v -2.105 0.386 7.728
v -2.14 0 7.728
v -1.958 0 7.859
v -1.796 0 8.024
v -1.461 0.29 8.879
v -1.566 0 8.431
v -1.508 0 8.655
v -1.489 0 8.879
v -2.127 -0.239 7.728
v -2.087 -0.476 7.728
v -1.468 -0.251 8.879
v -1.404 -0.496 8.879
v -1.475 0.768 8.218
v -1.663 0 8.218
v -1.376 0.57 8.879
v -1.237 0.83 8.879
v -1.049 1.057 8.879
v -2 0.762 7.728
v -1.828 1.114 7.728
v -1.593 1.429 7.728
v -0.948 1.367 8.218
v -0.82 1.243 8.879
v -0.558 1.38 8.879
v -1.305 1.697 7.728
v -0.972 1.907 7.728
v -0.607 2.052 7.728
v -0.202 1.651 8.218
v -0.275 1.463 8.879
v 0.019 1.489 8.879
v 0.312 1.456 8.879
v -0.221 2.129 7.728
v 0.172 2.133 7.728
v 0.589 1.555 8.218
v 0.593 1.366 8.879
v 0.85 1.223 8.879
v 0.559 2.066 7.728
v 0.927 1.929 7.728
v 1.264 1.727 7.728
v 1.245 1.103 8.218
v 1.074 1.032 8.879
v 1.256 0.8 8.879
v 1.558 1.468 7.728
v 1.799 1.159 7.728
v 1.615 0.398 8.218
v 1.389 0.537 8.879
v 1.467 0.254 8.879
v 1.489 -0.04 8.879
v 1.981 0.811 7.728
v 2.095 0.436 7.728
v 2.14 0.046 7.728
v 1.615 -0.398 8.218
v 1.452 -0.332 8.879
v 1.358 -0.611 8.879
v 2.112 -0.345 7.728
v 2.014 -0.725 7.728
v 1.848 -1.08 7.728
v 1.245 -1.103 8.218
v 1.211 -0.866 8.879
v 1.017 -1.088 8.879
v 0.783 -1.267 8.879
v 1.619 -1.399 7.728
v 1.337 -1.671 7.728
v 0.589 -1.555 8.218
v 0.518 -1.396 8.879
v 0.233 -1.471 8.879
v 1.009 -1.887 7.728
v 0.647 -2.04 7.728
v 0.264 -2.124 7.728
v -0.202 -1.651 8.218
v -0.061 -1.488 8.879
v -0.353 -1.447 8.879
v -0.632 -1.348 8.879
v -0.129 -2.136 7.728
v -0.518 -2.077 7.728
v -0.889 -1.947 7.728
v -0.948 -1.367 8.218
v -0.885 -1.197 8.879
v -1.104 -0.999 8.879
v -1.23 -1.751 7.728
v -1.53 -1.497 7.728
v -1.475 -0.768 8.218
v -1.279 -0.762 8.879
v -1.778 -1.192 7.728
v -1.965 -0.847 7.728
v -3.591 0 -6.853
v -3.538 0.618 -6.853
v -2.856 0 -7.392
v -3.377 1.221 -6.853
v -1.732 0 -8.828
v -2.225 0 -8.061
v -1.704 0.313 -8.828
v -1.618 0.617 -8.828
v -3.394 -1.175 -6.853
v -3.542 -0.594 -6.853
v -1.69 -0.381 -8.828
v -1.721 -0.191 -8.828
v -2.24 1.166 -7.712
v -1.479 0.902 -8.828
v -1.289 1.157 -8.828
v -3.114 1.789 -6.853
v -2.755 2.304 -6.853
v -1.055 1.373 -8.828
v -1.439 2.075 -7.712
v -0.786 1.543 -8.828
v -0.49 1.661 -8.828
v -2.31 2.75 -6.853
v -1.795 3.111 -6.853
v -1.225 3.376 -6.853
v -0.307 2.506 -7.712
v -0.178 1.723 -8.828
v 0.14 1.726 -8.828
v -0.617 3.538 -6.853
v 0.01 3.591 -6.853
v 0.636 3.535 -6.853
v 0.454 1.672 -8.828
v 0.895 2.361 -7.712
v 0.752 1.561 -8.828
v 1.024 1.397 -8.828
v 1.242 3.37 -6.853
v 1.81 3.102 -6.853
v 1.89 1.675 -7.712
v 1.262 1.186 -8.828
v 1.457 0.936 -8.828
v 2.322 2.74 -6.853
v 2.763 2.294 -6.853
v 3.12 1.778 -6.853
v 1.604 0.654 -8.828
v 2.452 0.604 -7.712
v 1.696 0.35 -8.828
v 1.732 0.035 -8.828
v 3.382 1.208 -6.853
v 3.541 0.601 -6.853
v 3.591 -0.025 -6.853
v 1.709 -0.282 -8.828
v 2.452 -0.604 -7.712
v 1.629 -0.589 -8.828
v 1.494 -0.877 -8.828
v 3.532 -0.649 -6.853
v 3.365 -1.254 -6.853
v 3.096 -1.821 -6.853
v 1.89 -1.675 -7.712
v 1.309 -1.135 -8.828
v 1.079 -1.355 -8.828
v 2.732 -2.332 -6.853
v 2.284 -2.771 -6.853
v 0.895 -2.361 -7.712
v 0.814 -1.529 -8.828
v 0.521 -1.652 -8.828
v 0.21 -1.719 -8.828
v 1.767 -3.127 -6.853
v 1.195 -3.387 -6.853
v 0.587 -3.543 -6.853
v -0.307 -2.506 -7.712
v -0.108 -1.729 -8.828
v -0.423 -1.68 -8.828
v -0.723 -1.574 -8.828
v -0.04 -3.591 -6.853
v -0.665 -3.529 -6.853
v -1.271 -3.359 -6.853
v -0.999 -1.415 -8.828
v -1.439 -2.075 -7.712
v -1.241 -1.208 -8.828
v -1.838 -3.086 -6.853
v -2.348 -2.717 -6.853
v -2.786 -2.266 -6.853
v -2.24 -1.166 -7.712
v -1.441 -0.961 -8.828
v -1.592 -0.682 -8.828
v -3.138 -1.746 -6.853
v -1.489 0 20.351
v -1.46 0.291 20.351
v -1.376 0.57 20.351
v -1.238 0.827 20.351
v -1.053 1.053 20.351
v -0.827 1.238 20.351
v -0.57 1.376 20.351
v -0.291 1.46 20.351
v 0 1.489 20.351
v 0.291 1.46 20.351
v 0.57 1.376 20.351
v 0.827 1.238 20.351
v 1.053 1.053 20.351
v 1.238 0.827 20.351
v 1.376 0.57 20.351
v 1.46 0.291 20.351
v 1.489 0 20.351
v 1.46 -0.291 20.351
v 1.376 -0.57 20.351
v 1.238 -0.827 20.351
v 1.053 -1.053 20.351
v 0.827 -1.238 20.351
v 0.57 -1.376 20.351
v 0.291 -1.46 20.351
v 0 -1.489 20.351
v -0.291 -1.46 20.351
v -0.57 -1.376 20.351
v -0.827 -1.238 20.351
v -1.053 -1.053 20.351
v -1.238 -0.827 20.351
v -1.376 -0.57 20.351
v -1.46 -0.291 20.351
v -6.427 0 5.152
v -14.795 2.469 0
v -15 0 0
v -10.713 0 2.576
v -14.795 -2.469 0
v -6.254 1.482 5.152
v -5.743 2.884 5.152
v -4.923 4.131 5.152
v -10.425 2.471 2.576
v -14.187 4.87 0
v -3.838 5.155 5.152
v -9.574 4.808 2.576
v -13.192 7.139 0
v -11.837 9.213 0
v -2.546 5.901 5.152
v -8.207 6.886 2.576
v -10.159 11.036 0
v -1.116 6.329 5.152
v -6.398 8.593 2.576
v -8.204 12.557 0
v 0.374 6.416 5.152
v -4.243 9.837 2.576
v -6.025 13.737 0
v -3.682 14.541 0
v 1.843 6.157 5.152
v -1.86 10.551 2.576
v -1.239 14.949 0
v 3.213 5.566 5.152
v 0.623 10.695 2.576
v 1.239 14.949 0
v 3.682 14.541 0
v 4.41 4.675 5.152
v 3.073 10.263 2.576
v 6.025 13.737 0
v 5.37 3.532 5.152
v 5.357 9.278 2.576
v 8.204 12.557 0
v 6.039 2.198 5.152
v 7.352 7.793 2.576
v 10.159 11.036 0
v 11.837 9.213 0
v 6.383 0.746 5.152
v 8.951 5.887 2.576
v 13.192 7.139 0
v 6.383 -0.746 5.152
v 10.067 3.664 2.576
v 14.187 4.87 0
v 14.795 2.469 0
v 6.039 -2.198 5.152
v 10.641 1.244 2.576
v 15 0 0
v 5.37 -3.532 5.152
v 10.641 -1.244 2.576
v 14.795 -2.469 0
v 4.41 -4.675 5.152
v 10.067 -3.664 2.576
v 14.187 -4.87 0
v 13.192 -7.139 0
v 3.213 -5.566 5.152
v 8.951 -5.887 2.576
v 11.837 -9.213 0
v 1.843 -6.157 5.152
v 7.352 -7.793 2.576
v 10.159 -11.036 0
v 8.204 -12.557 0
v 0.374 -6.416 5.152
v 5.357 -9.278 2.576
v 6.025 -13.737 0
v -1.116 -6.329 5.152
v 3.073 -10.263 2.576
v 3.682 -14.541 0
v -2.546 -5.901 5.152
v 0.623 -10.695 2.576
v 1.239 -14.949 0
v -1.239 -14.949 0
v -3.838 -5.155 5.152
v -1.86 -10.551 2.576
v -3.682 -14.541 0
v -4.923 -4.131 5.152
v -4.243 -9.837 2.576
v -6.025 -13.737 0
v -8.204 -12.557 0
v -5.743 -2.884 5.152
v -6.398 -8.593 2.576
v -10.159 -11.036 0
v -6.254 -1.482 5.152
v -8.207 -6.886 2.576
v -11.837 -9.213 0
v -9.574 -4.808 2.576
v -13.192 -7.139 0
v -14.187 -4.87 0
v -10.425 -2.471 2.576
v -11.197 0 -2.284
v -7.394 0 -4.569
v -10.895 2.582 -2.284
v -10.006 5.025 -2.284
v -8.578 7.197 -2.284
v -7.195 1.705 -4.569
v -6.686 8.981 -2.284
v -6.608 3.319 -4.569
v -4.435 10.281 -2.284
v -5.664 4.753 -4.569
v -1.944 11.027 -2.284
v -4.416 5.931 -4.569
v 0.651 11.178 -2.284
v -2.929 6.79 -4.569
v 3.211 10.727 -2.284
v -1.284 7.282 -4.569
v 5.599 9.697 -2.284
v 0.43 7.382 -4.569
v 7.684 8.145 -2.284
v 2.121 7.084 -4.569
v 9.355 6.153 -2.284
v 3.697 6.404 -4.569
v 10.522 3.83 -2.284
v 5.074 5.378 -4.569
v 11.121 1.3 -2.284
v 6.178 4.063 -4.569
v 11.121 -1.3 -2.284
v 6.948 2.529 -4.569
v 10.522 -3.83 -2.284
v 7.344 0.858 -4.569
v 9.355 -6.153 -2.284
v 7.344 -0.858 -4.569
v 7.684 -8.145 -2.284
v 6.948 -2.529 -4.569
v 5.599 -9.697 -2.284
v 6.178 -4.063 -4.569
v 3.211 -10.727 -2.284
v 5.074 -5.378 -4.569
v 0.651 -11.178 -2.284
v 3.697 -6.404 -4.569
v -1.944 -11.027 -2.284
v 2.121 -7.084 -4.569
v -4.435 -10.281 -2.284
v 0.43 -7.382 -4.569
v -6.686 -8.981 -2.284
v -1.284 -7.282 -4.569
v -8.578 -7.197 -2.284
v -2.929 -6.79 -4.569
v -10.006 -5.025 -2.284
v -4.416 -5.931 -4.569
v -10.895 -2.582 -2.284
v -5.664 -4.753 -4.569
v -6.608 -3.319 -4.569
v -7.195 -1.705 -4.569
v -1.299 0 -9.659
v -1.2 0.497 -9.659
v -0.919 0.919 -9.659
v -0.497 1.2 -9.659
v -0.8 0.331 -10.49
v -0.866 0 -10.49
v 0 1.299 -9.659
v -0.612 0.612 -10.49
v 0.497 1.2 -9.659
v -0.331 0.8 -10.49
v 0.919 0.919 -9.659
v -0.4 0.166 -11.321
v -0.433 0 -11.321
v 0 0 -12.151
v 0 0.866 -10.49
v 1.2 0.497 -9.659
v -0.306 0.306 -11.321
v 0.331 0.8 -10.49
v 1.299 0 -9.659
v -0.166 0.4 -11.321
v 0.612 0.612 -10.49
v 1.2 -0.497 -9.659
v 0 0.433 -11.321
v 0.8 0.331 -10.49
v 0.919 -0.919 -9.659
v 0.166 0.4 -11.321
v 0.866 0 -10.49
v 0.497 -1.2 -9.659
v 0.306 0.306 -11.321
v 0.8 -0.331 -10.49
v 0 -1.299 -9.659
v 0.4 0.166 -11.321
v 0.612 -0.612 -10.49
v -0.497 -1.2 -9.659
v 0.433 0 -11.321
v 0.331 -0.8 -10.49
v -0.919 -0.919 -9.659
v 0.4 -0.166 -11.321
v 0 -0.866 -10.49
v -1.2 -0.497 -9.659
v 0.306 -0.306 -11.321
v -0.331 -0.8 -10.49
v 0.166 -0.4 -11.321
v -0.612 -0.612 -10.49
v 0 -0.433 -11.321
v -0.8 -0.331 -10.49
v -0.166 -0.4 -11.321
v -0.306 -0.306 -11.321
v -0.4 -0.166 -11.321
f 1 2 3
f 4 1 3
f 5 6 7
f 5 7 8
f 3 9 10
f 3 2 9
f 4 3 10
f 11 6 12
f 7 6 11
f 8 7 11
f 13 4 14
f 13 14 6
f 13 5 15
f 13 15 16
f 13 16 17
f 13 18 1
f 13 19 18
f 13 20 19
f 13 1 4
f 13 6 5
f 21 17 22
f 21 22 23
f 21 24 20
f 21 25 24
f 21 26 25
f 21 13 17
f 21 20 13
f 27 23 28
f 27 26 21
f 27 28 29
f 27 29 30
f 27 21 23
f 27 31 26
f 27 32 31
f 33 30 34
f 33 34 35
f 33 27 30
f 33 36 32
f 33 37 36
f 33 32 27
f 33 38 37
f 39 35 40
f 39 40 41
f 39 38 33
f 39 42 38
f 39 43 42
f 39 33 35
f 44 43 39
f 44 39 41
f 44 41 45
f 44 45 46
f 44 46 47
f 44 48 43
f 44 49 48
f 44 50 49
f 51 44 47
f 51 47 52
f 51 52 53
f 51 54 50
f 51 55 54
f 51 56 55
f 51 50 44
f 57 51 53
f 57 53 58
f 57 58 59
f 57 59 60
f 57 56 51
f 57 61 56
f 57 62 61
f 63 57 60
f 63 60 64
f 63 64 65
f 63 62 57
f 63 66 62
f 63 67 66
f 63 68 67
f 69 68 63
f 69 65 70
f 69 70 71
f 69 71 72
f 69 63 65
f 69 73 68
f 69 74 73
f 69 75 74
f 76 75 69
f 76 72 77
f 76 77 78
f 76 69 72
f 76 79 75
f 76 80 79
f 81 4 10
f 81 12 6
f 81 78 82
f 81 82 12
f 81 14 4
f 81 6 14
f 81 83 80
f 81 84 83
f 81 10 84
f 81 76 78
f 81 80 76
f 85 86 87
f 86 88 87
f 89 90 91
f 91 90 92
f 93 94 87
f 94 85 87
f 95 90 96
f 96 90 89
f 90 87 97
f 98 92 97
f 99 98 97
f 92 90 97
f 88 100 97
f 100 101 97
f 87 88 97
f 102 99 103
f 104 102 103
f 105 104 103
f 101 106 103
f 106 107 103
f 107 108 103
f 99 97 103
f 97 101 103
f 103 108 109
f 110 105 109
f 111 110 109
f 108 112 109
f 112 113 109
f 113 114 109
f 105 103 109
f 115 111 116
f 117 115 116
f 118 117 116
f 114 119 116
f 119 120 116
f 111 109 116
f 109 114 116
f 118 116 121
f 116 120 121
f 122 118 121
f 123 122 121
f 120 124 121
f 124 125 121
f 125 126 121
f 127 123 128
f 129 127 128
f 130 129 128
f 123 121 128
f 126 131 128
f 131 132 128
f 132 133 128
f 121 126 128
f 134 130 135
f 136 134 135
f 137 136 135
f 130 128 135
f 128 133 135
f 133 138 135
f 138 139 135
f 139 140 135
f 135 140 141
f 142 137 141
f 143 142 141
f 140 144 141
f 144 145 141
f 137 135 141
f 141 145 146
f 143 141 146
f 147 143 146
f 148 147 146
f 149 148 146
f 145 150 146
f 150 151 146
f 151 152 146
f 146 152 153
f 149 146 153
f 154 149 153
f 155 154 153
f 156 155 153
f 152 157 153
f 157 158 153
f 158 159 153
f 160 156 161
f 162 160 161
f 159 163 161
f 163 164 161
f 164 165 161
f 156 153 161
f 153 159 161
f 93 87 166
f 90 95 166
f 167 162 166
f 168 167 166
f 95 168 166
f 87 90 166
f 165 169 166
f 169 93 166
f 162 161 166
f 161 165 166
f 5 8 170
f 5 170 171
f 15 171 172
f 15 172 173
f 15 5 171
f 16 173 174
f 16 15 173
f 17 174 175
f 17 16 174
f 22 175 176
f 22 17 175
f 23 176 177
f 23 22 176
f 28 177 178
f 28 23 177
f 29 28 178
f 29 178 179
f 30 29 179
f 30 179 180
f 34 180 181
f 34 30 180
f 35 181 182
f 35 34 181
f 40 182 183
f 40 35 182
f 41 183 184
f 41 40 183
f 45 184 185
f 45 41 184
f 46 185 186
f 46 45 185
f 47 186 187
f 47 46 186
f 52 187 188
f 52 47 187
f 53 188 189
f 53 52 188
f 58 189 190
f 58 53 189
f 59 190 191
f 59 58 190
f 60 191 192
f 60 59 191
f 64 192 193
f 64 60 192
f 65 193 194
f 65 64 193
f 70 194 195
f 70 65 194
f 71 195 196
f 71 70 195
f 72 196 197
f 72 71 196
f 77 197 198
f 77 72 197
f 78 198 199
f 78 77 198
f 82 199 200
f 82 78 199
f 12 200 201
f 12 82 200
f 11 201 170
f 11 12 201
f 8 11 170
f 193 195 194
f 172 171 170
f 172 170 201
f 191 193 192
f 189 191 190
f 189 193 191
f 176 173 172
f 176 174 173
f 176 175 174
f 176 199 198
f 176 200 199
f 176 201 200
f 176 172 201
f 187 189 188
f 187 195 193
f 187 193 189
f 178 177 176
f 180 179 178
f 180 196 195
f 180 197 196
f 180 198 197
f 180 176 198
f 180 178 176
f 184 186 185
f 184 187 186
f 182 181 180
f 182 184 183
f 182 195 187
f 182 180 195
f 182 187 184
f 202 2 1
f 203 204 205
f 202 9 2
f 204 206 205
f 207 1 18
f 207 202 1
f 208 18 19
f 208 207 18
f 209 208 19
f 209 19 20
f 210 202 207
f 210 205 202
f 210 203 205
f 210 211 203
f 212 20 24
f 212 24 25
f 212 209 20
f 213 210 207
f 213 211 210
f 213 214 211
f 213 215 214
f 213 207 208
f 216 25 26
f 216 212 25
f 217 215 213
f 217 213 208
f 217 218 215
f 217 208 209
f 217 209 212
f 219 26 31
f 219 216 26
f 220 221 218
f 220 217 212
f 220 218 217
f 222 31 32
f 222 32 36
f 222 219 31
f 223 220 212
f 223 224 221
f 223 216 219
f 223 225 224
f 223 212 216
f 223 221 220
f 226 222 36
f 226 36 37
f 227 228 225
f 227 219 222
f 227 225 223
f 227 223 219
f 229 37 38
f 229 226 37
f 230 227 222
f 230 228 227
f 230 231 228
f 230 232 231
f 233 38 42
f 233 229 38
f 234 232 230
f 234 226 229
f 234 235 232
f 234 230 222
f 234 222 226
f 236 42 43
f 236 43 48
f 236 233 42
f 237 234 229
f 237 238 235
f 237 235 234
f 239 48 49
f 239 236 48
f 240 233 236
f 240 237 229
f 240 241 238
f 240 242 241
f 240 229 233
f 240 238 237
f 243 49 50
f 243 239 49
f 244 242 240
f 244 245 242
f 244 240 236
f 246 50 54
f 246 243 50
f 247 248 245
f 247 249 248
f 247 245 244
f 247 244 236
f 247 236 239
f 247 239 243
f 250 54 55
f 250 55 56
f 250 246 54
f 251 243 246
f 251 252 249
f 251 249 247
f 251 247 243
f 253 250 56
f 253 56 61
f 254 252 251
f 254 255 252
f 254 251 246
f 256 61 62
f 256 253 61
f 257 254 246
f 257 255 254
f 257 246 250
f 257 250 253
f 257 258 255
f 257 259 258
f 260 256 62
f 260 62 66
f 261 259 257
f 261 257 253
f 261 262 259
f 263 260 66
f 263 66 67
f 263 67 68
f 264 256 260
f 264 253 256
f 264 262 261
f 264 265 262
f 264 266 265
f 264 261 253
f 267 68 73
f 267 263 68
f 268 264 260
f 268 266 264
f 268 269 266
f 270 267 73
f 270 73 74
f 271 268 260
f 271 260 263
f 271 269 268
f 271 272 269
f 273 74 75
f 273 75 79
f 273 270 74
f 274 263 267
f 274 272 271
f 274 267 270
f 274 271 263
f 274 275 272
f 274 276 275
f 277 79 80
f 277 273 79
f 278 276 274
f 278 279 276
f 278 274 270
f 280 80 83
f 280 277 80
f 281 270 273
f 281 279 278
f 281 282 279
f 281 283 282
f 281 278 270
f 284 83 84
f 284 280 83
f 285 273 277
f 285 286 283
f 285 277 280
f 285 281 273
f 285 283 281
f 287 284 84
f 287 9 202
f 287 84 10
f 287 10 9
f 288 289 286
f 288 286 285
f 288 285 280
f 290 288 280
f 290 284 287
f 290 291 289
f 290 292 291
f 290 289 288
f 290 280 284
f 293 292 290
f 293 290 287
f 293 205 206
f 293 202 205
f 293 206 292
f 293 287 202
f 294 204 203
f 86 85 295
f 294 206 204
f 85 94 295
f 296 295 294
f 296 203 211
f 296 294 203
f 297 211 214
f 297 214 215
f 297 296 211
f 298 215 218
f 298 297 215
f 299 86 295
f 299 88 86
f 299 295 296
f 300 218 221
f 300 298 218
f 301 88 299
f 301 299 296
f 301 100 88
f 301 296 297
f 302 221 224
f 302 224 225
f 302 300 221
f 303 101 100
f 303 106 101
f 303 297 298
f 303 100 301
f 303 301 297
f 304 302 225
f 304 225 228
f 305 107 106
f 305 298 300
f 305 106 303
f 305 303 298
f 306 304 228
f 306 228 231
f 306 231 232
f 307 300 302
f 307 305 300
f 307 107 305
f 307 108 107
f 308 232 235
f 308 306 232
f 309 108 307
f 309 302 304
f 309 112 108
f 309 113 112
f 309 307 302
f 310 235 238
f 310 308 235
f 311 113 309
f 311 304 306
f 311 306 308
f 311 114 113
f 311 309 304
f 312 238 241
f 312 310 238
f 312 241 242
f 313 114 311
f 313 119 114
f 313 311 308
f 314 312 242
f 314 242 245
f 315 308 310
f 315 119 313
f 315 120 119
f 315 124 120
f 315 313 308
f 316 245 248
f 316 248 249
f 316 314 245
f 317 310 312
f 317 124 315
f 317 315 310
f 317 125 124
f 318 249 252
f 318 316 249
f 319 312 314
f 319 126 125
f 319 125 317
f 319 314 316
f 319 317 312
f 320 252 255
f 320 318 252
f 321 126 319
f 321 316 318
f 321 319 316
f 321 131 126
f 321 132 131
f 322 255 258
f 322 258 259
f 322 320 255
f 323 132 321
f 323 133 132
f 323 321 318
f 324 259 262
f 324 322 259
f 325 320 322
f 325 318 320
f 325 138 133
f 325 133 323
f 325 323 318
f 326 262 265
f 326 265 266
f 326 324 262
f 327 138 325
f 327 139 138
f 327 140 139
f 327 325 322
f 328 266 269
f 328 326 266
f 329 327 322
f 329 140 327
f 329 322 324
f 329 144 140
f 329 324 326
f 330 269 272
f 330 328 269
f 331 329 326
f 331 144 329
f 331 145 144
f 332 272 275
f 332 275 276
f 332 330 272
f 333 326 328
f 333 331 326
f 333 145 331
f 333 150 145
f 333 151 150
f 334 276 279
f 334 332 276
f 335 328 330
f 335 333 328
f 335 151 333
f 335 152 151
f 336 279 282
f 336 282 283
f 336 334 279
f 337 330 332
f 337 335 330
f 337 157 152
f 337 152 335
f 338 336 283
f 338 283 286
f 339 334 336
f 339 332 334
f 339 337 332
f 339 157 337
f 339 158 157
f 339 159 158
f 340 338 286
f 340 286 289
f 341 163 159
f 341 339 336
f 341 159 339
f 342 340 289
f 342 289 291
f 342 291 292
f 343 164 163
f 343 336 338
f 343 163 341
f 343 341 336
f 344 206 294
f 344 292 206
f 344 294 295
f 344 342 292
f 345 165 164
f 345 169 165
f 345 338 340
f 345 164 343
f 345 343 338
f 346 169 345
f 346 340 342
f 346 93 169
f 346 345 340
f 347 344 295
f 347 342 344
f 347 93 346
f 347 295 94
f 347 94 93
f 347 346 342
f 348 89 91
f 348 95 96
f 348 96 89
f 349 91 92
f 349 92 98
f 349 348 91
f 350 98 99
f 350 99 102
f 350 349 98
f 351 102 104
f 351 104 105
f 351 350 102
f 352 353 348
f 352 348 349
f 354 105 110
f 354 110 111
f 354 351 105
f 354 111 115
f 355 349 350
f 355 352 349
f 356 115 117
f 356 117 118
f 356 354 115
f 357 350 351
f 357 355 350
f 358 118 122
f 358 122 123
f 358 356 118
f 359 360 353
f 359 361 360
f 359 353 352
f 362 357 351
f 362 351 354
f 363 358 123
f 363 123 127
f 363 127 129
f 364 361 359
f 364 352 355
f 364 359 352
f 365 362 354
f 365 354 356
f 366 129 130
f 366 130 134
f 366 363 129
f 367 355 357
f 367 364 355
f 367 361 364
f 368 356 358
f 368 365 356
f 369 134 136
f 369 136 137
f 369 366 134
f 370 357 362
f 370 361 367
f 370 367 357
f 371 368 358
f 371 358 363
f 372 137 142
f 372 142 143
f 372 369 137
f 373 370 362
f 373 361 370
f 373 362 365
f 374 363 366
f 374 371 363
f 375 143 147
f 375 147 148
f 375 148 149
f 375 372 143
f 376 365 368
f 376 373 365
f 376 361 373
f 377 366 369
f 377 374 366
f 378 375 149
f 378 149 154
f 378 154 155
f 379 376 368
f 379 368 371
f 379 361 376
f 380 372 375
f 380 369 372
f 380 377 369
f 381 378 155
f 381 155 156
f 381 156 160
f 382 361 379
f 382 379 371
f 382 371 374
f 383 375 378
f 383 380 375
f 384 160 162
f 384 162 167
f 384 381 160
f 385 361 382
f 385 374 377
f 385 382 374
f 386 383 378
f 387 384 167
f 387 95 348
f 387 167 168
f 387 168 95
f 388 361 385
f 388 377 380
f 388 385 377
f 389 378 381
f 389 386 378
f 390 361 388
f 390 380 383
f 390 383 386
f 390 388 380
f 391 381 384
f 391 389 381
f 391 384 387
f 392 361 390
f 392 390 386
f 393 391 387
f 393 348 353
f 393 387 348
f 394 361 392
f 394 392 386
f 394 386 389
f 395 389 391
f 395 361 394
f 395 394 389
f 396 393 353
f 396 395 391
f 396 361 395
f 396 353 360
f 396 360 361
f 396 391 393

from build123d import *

# Parameters (mm, degrees)
F2_R = 5
F3_R = 1.3428215566


with BuildPart() as f1:
    # F0 (on Front) → F1 (revolve)
    with BuildSketch(Plane.XZ):
        Polygon((-1.4891009778, 20.3513566048), (-1.4891009778, 8.119039867), (0, 9.0138781887), (0, 20.3513566048), align=None)
        Polygon((-1.4891009778, 8.119039867), (-15, 0), (0, 0), (0, 9.0138781887), align=None)
        Polygon((0, 0), (-15, 0), (-2.3833475581, -7.5784025668), (0, -9.01), align=None)
        Polygon((0, -9.01), (-2.3833475581, -7.5784025668), (0, -12.1514424682), align=None)
    revolve(axis=Axis((0, 0, -4.505), (0, 0, -1)))

    # F2
    f2_edges = [f1.edges().sort_by_distance(p)[0] for p in [
        (2.383348, 0, -7.578403),
    ]]
    fillet(f2_edges, radius=F2_R)

    # F3
    f3_edges = [f1.edges().sort_by_distance(p)[0] for p in [
        (1.489101, 0, 8.11904),
    ]]
    fillet(f3_edges, radius=F3_R)


solid = f1.part
